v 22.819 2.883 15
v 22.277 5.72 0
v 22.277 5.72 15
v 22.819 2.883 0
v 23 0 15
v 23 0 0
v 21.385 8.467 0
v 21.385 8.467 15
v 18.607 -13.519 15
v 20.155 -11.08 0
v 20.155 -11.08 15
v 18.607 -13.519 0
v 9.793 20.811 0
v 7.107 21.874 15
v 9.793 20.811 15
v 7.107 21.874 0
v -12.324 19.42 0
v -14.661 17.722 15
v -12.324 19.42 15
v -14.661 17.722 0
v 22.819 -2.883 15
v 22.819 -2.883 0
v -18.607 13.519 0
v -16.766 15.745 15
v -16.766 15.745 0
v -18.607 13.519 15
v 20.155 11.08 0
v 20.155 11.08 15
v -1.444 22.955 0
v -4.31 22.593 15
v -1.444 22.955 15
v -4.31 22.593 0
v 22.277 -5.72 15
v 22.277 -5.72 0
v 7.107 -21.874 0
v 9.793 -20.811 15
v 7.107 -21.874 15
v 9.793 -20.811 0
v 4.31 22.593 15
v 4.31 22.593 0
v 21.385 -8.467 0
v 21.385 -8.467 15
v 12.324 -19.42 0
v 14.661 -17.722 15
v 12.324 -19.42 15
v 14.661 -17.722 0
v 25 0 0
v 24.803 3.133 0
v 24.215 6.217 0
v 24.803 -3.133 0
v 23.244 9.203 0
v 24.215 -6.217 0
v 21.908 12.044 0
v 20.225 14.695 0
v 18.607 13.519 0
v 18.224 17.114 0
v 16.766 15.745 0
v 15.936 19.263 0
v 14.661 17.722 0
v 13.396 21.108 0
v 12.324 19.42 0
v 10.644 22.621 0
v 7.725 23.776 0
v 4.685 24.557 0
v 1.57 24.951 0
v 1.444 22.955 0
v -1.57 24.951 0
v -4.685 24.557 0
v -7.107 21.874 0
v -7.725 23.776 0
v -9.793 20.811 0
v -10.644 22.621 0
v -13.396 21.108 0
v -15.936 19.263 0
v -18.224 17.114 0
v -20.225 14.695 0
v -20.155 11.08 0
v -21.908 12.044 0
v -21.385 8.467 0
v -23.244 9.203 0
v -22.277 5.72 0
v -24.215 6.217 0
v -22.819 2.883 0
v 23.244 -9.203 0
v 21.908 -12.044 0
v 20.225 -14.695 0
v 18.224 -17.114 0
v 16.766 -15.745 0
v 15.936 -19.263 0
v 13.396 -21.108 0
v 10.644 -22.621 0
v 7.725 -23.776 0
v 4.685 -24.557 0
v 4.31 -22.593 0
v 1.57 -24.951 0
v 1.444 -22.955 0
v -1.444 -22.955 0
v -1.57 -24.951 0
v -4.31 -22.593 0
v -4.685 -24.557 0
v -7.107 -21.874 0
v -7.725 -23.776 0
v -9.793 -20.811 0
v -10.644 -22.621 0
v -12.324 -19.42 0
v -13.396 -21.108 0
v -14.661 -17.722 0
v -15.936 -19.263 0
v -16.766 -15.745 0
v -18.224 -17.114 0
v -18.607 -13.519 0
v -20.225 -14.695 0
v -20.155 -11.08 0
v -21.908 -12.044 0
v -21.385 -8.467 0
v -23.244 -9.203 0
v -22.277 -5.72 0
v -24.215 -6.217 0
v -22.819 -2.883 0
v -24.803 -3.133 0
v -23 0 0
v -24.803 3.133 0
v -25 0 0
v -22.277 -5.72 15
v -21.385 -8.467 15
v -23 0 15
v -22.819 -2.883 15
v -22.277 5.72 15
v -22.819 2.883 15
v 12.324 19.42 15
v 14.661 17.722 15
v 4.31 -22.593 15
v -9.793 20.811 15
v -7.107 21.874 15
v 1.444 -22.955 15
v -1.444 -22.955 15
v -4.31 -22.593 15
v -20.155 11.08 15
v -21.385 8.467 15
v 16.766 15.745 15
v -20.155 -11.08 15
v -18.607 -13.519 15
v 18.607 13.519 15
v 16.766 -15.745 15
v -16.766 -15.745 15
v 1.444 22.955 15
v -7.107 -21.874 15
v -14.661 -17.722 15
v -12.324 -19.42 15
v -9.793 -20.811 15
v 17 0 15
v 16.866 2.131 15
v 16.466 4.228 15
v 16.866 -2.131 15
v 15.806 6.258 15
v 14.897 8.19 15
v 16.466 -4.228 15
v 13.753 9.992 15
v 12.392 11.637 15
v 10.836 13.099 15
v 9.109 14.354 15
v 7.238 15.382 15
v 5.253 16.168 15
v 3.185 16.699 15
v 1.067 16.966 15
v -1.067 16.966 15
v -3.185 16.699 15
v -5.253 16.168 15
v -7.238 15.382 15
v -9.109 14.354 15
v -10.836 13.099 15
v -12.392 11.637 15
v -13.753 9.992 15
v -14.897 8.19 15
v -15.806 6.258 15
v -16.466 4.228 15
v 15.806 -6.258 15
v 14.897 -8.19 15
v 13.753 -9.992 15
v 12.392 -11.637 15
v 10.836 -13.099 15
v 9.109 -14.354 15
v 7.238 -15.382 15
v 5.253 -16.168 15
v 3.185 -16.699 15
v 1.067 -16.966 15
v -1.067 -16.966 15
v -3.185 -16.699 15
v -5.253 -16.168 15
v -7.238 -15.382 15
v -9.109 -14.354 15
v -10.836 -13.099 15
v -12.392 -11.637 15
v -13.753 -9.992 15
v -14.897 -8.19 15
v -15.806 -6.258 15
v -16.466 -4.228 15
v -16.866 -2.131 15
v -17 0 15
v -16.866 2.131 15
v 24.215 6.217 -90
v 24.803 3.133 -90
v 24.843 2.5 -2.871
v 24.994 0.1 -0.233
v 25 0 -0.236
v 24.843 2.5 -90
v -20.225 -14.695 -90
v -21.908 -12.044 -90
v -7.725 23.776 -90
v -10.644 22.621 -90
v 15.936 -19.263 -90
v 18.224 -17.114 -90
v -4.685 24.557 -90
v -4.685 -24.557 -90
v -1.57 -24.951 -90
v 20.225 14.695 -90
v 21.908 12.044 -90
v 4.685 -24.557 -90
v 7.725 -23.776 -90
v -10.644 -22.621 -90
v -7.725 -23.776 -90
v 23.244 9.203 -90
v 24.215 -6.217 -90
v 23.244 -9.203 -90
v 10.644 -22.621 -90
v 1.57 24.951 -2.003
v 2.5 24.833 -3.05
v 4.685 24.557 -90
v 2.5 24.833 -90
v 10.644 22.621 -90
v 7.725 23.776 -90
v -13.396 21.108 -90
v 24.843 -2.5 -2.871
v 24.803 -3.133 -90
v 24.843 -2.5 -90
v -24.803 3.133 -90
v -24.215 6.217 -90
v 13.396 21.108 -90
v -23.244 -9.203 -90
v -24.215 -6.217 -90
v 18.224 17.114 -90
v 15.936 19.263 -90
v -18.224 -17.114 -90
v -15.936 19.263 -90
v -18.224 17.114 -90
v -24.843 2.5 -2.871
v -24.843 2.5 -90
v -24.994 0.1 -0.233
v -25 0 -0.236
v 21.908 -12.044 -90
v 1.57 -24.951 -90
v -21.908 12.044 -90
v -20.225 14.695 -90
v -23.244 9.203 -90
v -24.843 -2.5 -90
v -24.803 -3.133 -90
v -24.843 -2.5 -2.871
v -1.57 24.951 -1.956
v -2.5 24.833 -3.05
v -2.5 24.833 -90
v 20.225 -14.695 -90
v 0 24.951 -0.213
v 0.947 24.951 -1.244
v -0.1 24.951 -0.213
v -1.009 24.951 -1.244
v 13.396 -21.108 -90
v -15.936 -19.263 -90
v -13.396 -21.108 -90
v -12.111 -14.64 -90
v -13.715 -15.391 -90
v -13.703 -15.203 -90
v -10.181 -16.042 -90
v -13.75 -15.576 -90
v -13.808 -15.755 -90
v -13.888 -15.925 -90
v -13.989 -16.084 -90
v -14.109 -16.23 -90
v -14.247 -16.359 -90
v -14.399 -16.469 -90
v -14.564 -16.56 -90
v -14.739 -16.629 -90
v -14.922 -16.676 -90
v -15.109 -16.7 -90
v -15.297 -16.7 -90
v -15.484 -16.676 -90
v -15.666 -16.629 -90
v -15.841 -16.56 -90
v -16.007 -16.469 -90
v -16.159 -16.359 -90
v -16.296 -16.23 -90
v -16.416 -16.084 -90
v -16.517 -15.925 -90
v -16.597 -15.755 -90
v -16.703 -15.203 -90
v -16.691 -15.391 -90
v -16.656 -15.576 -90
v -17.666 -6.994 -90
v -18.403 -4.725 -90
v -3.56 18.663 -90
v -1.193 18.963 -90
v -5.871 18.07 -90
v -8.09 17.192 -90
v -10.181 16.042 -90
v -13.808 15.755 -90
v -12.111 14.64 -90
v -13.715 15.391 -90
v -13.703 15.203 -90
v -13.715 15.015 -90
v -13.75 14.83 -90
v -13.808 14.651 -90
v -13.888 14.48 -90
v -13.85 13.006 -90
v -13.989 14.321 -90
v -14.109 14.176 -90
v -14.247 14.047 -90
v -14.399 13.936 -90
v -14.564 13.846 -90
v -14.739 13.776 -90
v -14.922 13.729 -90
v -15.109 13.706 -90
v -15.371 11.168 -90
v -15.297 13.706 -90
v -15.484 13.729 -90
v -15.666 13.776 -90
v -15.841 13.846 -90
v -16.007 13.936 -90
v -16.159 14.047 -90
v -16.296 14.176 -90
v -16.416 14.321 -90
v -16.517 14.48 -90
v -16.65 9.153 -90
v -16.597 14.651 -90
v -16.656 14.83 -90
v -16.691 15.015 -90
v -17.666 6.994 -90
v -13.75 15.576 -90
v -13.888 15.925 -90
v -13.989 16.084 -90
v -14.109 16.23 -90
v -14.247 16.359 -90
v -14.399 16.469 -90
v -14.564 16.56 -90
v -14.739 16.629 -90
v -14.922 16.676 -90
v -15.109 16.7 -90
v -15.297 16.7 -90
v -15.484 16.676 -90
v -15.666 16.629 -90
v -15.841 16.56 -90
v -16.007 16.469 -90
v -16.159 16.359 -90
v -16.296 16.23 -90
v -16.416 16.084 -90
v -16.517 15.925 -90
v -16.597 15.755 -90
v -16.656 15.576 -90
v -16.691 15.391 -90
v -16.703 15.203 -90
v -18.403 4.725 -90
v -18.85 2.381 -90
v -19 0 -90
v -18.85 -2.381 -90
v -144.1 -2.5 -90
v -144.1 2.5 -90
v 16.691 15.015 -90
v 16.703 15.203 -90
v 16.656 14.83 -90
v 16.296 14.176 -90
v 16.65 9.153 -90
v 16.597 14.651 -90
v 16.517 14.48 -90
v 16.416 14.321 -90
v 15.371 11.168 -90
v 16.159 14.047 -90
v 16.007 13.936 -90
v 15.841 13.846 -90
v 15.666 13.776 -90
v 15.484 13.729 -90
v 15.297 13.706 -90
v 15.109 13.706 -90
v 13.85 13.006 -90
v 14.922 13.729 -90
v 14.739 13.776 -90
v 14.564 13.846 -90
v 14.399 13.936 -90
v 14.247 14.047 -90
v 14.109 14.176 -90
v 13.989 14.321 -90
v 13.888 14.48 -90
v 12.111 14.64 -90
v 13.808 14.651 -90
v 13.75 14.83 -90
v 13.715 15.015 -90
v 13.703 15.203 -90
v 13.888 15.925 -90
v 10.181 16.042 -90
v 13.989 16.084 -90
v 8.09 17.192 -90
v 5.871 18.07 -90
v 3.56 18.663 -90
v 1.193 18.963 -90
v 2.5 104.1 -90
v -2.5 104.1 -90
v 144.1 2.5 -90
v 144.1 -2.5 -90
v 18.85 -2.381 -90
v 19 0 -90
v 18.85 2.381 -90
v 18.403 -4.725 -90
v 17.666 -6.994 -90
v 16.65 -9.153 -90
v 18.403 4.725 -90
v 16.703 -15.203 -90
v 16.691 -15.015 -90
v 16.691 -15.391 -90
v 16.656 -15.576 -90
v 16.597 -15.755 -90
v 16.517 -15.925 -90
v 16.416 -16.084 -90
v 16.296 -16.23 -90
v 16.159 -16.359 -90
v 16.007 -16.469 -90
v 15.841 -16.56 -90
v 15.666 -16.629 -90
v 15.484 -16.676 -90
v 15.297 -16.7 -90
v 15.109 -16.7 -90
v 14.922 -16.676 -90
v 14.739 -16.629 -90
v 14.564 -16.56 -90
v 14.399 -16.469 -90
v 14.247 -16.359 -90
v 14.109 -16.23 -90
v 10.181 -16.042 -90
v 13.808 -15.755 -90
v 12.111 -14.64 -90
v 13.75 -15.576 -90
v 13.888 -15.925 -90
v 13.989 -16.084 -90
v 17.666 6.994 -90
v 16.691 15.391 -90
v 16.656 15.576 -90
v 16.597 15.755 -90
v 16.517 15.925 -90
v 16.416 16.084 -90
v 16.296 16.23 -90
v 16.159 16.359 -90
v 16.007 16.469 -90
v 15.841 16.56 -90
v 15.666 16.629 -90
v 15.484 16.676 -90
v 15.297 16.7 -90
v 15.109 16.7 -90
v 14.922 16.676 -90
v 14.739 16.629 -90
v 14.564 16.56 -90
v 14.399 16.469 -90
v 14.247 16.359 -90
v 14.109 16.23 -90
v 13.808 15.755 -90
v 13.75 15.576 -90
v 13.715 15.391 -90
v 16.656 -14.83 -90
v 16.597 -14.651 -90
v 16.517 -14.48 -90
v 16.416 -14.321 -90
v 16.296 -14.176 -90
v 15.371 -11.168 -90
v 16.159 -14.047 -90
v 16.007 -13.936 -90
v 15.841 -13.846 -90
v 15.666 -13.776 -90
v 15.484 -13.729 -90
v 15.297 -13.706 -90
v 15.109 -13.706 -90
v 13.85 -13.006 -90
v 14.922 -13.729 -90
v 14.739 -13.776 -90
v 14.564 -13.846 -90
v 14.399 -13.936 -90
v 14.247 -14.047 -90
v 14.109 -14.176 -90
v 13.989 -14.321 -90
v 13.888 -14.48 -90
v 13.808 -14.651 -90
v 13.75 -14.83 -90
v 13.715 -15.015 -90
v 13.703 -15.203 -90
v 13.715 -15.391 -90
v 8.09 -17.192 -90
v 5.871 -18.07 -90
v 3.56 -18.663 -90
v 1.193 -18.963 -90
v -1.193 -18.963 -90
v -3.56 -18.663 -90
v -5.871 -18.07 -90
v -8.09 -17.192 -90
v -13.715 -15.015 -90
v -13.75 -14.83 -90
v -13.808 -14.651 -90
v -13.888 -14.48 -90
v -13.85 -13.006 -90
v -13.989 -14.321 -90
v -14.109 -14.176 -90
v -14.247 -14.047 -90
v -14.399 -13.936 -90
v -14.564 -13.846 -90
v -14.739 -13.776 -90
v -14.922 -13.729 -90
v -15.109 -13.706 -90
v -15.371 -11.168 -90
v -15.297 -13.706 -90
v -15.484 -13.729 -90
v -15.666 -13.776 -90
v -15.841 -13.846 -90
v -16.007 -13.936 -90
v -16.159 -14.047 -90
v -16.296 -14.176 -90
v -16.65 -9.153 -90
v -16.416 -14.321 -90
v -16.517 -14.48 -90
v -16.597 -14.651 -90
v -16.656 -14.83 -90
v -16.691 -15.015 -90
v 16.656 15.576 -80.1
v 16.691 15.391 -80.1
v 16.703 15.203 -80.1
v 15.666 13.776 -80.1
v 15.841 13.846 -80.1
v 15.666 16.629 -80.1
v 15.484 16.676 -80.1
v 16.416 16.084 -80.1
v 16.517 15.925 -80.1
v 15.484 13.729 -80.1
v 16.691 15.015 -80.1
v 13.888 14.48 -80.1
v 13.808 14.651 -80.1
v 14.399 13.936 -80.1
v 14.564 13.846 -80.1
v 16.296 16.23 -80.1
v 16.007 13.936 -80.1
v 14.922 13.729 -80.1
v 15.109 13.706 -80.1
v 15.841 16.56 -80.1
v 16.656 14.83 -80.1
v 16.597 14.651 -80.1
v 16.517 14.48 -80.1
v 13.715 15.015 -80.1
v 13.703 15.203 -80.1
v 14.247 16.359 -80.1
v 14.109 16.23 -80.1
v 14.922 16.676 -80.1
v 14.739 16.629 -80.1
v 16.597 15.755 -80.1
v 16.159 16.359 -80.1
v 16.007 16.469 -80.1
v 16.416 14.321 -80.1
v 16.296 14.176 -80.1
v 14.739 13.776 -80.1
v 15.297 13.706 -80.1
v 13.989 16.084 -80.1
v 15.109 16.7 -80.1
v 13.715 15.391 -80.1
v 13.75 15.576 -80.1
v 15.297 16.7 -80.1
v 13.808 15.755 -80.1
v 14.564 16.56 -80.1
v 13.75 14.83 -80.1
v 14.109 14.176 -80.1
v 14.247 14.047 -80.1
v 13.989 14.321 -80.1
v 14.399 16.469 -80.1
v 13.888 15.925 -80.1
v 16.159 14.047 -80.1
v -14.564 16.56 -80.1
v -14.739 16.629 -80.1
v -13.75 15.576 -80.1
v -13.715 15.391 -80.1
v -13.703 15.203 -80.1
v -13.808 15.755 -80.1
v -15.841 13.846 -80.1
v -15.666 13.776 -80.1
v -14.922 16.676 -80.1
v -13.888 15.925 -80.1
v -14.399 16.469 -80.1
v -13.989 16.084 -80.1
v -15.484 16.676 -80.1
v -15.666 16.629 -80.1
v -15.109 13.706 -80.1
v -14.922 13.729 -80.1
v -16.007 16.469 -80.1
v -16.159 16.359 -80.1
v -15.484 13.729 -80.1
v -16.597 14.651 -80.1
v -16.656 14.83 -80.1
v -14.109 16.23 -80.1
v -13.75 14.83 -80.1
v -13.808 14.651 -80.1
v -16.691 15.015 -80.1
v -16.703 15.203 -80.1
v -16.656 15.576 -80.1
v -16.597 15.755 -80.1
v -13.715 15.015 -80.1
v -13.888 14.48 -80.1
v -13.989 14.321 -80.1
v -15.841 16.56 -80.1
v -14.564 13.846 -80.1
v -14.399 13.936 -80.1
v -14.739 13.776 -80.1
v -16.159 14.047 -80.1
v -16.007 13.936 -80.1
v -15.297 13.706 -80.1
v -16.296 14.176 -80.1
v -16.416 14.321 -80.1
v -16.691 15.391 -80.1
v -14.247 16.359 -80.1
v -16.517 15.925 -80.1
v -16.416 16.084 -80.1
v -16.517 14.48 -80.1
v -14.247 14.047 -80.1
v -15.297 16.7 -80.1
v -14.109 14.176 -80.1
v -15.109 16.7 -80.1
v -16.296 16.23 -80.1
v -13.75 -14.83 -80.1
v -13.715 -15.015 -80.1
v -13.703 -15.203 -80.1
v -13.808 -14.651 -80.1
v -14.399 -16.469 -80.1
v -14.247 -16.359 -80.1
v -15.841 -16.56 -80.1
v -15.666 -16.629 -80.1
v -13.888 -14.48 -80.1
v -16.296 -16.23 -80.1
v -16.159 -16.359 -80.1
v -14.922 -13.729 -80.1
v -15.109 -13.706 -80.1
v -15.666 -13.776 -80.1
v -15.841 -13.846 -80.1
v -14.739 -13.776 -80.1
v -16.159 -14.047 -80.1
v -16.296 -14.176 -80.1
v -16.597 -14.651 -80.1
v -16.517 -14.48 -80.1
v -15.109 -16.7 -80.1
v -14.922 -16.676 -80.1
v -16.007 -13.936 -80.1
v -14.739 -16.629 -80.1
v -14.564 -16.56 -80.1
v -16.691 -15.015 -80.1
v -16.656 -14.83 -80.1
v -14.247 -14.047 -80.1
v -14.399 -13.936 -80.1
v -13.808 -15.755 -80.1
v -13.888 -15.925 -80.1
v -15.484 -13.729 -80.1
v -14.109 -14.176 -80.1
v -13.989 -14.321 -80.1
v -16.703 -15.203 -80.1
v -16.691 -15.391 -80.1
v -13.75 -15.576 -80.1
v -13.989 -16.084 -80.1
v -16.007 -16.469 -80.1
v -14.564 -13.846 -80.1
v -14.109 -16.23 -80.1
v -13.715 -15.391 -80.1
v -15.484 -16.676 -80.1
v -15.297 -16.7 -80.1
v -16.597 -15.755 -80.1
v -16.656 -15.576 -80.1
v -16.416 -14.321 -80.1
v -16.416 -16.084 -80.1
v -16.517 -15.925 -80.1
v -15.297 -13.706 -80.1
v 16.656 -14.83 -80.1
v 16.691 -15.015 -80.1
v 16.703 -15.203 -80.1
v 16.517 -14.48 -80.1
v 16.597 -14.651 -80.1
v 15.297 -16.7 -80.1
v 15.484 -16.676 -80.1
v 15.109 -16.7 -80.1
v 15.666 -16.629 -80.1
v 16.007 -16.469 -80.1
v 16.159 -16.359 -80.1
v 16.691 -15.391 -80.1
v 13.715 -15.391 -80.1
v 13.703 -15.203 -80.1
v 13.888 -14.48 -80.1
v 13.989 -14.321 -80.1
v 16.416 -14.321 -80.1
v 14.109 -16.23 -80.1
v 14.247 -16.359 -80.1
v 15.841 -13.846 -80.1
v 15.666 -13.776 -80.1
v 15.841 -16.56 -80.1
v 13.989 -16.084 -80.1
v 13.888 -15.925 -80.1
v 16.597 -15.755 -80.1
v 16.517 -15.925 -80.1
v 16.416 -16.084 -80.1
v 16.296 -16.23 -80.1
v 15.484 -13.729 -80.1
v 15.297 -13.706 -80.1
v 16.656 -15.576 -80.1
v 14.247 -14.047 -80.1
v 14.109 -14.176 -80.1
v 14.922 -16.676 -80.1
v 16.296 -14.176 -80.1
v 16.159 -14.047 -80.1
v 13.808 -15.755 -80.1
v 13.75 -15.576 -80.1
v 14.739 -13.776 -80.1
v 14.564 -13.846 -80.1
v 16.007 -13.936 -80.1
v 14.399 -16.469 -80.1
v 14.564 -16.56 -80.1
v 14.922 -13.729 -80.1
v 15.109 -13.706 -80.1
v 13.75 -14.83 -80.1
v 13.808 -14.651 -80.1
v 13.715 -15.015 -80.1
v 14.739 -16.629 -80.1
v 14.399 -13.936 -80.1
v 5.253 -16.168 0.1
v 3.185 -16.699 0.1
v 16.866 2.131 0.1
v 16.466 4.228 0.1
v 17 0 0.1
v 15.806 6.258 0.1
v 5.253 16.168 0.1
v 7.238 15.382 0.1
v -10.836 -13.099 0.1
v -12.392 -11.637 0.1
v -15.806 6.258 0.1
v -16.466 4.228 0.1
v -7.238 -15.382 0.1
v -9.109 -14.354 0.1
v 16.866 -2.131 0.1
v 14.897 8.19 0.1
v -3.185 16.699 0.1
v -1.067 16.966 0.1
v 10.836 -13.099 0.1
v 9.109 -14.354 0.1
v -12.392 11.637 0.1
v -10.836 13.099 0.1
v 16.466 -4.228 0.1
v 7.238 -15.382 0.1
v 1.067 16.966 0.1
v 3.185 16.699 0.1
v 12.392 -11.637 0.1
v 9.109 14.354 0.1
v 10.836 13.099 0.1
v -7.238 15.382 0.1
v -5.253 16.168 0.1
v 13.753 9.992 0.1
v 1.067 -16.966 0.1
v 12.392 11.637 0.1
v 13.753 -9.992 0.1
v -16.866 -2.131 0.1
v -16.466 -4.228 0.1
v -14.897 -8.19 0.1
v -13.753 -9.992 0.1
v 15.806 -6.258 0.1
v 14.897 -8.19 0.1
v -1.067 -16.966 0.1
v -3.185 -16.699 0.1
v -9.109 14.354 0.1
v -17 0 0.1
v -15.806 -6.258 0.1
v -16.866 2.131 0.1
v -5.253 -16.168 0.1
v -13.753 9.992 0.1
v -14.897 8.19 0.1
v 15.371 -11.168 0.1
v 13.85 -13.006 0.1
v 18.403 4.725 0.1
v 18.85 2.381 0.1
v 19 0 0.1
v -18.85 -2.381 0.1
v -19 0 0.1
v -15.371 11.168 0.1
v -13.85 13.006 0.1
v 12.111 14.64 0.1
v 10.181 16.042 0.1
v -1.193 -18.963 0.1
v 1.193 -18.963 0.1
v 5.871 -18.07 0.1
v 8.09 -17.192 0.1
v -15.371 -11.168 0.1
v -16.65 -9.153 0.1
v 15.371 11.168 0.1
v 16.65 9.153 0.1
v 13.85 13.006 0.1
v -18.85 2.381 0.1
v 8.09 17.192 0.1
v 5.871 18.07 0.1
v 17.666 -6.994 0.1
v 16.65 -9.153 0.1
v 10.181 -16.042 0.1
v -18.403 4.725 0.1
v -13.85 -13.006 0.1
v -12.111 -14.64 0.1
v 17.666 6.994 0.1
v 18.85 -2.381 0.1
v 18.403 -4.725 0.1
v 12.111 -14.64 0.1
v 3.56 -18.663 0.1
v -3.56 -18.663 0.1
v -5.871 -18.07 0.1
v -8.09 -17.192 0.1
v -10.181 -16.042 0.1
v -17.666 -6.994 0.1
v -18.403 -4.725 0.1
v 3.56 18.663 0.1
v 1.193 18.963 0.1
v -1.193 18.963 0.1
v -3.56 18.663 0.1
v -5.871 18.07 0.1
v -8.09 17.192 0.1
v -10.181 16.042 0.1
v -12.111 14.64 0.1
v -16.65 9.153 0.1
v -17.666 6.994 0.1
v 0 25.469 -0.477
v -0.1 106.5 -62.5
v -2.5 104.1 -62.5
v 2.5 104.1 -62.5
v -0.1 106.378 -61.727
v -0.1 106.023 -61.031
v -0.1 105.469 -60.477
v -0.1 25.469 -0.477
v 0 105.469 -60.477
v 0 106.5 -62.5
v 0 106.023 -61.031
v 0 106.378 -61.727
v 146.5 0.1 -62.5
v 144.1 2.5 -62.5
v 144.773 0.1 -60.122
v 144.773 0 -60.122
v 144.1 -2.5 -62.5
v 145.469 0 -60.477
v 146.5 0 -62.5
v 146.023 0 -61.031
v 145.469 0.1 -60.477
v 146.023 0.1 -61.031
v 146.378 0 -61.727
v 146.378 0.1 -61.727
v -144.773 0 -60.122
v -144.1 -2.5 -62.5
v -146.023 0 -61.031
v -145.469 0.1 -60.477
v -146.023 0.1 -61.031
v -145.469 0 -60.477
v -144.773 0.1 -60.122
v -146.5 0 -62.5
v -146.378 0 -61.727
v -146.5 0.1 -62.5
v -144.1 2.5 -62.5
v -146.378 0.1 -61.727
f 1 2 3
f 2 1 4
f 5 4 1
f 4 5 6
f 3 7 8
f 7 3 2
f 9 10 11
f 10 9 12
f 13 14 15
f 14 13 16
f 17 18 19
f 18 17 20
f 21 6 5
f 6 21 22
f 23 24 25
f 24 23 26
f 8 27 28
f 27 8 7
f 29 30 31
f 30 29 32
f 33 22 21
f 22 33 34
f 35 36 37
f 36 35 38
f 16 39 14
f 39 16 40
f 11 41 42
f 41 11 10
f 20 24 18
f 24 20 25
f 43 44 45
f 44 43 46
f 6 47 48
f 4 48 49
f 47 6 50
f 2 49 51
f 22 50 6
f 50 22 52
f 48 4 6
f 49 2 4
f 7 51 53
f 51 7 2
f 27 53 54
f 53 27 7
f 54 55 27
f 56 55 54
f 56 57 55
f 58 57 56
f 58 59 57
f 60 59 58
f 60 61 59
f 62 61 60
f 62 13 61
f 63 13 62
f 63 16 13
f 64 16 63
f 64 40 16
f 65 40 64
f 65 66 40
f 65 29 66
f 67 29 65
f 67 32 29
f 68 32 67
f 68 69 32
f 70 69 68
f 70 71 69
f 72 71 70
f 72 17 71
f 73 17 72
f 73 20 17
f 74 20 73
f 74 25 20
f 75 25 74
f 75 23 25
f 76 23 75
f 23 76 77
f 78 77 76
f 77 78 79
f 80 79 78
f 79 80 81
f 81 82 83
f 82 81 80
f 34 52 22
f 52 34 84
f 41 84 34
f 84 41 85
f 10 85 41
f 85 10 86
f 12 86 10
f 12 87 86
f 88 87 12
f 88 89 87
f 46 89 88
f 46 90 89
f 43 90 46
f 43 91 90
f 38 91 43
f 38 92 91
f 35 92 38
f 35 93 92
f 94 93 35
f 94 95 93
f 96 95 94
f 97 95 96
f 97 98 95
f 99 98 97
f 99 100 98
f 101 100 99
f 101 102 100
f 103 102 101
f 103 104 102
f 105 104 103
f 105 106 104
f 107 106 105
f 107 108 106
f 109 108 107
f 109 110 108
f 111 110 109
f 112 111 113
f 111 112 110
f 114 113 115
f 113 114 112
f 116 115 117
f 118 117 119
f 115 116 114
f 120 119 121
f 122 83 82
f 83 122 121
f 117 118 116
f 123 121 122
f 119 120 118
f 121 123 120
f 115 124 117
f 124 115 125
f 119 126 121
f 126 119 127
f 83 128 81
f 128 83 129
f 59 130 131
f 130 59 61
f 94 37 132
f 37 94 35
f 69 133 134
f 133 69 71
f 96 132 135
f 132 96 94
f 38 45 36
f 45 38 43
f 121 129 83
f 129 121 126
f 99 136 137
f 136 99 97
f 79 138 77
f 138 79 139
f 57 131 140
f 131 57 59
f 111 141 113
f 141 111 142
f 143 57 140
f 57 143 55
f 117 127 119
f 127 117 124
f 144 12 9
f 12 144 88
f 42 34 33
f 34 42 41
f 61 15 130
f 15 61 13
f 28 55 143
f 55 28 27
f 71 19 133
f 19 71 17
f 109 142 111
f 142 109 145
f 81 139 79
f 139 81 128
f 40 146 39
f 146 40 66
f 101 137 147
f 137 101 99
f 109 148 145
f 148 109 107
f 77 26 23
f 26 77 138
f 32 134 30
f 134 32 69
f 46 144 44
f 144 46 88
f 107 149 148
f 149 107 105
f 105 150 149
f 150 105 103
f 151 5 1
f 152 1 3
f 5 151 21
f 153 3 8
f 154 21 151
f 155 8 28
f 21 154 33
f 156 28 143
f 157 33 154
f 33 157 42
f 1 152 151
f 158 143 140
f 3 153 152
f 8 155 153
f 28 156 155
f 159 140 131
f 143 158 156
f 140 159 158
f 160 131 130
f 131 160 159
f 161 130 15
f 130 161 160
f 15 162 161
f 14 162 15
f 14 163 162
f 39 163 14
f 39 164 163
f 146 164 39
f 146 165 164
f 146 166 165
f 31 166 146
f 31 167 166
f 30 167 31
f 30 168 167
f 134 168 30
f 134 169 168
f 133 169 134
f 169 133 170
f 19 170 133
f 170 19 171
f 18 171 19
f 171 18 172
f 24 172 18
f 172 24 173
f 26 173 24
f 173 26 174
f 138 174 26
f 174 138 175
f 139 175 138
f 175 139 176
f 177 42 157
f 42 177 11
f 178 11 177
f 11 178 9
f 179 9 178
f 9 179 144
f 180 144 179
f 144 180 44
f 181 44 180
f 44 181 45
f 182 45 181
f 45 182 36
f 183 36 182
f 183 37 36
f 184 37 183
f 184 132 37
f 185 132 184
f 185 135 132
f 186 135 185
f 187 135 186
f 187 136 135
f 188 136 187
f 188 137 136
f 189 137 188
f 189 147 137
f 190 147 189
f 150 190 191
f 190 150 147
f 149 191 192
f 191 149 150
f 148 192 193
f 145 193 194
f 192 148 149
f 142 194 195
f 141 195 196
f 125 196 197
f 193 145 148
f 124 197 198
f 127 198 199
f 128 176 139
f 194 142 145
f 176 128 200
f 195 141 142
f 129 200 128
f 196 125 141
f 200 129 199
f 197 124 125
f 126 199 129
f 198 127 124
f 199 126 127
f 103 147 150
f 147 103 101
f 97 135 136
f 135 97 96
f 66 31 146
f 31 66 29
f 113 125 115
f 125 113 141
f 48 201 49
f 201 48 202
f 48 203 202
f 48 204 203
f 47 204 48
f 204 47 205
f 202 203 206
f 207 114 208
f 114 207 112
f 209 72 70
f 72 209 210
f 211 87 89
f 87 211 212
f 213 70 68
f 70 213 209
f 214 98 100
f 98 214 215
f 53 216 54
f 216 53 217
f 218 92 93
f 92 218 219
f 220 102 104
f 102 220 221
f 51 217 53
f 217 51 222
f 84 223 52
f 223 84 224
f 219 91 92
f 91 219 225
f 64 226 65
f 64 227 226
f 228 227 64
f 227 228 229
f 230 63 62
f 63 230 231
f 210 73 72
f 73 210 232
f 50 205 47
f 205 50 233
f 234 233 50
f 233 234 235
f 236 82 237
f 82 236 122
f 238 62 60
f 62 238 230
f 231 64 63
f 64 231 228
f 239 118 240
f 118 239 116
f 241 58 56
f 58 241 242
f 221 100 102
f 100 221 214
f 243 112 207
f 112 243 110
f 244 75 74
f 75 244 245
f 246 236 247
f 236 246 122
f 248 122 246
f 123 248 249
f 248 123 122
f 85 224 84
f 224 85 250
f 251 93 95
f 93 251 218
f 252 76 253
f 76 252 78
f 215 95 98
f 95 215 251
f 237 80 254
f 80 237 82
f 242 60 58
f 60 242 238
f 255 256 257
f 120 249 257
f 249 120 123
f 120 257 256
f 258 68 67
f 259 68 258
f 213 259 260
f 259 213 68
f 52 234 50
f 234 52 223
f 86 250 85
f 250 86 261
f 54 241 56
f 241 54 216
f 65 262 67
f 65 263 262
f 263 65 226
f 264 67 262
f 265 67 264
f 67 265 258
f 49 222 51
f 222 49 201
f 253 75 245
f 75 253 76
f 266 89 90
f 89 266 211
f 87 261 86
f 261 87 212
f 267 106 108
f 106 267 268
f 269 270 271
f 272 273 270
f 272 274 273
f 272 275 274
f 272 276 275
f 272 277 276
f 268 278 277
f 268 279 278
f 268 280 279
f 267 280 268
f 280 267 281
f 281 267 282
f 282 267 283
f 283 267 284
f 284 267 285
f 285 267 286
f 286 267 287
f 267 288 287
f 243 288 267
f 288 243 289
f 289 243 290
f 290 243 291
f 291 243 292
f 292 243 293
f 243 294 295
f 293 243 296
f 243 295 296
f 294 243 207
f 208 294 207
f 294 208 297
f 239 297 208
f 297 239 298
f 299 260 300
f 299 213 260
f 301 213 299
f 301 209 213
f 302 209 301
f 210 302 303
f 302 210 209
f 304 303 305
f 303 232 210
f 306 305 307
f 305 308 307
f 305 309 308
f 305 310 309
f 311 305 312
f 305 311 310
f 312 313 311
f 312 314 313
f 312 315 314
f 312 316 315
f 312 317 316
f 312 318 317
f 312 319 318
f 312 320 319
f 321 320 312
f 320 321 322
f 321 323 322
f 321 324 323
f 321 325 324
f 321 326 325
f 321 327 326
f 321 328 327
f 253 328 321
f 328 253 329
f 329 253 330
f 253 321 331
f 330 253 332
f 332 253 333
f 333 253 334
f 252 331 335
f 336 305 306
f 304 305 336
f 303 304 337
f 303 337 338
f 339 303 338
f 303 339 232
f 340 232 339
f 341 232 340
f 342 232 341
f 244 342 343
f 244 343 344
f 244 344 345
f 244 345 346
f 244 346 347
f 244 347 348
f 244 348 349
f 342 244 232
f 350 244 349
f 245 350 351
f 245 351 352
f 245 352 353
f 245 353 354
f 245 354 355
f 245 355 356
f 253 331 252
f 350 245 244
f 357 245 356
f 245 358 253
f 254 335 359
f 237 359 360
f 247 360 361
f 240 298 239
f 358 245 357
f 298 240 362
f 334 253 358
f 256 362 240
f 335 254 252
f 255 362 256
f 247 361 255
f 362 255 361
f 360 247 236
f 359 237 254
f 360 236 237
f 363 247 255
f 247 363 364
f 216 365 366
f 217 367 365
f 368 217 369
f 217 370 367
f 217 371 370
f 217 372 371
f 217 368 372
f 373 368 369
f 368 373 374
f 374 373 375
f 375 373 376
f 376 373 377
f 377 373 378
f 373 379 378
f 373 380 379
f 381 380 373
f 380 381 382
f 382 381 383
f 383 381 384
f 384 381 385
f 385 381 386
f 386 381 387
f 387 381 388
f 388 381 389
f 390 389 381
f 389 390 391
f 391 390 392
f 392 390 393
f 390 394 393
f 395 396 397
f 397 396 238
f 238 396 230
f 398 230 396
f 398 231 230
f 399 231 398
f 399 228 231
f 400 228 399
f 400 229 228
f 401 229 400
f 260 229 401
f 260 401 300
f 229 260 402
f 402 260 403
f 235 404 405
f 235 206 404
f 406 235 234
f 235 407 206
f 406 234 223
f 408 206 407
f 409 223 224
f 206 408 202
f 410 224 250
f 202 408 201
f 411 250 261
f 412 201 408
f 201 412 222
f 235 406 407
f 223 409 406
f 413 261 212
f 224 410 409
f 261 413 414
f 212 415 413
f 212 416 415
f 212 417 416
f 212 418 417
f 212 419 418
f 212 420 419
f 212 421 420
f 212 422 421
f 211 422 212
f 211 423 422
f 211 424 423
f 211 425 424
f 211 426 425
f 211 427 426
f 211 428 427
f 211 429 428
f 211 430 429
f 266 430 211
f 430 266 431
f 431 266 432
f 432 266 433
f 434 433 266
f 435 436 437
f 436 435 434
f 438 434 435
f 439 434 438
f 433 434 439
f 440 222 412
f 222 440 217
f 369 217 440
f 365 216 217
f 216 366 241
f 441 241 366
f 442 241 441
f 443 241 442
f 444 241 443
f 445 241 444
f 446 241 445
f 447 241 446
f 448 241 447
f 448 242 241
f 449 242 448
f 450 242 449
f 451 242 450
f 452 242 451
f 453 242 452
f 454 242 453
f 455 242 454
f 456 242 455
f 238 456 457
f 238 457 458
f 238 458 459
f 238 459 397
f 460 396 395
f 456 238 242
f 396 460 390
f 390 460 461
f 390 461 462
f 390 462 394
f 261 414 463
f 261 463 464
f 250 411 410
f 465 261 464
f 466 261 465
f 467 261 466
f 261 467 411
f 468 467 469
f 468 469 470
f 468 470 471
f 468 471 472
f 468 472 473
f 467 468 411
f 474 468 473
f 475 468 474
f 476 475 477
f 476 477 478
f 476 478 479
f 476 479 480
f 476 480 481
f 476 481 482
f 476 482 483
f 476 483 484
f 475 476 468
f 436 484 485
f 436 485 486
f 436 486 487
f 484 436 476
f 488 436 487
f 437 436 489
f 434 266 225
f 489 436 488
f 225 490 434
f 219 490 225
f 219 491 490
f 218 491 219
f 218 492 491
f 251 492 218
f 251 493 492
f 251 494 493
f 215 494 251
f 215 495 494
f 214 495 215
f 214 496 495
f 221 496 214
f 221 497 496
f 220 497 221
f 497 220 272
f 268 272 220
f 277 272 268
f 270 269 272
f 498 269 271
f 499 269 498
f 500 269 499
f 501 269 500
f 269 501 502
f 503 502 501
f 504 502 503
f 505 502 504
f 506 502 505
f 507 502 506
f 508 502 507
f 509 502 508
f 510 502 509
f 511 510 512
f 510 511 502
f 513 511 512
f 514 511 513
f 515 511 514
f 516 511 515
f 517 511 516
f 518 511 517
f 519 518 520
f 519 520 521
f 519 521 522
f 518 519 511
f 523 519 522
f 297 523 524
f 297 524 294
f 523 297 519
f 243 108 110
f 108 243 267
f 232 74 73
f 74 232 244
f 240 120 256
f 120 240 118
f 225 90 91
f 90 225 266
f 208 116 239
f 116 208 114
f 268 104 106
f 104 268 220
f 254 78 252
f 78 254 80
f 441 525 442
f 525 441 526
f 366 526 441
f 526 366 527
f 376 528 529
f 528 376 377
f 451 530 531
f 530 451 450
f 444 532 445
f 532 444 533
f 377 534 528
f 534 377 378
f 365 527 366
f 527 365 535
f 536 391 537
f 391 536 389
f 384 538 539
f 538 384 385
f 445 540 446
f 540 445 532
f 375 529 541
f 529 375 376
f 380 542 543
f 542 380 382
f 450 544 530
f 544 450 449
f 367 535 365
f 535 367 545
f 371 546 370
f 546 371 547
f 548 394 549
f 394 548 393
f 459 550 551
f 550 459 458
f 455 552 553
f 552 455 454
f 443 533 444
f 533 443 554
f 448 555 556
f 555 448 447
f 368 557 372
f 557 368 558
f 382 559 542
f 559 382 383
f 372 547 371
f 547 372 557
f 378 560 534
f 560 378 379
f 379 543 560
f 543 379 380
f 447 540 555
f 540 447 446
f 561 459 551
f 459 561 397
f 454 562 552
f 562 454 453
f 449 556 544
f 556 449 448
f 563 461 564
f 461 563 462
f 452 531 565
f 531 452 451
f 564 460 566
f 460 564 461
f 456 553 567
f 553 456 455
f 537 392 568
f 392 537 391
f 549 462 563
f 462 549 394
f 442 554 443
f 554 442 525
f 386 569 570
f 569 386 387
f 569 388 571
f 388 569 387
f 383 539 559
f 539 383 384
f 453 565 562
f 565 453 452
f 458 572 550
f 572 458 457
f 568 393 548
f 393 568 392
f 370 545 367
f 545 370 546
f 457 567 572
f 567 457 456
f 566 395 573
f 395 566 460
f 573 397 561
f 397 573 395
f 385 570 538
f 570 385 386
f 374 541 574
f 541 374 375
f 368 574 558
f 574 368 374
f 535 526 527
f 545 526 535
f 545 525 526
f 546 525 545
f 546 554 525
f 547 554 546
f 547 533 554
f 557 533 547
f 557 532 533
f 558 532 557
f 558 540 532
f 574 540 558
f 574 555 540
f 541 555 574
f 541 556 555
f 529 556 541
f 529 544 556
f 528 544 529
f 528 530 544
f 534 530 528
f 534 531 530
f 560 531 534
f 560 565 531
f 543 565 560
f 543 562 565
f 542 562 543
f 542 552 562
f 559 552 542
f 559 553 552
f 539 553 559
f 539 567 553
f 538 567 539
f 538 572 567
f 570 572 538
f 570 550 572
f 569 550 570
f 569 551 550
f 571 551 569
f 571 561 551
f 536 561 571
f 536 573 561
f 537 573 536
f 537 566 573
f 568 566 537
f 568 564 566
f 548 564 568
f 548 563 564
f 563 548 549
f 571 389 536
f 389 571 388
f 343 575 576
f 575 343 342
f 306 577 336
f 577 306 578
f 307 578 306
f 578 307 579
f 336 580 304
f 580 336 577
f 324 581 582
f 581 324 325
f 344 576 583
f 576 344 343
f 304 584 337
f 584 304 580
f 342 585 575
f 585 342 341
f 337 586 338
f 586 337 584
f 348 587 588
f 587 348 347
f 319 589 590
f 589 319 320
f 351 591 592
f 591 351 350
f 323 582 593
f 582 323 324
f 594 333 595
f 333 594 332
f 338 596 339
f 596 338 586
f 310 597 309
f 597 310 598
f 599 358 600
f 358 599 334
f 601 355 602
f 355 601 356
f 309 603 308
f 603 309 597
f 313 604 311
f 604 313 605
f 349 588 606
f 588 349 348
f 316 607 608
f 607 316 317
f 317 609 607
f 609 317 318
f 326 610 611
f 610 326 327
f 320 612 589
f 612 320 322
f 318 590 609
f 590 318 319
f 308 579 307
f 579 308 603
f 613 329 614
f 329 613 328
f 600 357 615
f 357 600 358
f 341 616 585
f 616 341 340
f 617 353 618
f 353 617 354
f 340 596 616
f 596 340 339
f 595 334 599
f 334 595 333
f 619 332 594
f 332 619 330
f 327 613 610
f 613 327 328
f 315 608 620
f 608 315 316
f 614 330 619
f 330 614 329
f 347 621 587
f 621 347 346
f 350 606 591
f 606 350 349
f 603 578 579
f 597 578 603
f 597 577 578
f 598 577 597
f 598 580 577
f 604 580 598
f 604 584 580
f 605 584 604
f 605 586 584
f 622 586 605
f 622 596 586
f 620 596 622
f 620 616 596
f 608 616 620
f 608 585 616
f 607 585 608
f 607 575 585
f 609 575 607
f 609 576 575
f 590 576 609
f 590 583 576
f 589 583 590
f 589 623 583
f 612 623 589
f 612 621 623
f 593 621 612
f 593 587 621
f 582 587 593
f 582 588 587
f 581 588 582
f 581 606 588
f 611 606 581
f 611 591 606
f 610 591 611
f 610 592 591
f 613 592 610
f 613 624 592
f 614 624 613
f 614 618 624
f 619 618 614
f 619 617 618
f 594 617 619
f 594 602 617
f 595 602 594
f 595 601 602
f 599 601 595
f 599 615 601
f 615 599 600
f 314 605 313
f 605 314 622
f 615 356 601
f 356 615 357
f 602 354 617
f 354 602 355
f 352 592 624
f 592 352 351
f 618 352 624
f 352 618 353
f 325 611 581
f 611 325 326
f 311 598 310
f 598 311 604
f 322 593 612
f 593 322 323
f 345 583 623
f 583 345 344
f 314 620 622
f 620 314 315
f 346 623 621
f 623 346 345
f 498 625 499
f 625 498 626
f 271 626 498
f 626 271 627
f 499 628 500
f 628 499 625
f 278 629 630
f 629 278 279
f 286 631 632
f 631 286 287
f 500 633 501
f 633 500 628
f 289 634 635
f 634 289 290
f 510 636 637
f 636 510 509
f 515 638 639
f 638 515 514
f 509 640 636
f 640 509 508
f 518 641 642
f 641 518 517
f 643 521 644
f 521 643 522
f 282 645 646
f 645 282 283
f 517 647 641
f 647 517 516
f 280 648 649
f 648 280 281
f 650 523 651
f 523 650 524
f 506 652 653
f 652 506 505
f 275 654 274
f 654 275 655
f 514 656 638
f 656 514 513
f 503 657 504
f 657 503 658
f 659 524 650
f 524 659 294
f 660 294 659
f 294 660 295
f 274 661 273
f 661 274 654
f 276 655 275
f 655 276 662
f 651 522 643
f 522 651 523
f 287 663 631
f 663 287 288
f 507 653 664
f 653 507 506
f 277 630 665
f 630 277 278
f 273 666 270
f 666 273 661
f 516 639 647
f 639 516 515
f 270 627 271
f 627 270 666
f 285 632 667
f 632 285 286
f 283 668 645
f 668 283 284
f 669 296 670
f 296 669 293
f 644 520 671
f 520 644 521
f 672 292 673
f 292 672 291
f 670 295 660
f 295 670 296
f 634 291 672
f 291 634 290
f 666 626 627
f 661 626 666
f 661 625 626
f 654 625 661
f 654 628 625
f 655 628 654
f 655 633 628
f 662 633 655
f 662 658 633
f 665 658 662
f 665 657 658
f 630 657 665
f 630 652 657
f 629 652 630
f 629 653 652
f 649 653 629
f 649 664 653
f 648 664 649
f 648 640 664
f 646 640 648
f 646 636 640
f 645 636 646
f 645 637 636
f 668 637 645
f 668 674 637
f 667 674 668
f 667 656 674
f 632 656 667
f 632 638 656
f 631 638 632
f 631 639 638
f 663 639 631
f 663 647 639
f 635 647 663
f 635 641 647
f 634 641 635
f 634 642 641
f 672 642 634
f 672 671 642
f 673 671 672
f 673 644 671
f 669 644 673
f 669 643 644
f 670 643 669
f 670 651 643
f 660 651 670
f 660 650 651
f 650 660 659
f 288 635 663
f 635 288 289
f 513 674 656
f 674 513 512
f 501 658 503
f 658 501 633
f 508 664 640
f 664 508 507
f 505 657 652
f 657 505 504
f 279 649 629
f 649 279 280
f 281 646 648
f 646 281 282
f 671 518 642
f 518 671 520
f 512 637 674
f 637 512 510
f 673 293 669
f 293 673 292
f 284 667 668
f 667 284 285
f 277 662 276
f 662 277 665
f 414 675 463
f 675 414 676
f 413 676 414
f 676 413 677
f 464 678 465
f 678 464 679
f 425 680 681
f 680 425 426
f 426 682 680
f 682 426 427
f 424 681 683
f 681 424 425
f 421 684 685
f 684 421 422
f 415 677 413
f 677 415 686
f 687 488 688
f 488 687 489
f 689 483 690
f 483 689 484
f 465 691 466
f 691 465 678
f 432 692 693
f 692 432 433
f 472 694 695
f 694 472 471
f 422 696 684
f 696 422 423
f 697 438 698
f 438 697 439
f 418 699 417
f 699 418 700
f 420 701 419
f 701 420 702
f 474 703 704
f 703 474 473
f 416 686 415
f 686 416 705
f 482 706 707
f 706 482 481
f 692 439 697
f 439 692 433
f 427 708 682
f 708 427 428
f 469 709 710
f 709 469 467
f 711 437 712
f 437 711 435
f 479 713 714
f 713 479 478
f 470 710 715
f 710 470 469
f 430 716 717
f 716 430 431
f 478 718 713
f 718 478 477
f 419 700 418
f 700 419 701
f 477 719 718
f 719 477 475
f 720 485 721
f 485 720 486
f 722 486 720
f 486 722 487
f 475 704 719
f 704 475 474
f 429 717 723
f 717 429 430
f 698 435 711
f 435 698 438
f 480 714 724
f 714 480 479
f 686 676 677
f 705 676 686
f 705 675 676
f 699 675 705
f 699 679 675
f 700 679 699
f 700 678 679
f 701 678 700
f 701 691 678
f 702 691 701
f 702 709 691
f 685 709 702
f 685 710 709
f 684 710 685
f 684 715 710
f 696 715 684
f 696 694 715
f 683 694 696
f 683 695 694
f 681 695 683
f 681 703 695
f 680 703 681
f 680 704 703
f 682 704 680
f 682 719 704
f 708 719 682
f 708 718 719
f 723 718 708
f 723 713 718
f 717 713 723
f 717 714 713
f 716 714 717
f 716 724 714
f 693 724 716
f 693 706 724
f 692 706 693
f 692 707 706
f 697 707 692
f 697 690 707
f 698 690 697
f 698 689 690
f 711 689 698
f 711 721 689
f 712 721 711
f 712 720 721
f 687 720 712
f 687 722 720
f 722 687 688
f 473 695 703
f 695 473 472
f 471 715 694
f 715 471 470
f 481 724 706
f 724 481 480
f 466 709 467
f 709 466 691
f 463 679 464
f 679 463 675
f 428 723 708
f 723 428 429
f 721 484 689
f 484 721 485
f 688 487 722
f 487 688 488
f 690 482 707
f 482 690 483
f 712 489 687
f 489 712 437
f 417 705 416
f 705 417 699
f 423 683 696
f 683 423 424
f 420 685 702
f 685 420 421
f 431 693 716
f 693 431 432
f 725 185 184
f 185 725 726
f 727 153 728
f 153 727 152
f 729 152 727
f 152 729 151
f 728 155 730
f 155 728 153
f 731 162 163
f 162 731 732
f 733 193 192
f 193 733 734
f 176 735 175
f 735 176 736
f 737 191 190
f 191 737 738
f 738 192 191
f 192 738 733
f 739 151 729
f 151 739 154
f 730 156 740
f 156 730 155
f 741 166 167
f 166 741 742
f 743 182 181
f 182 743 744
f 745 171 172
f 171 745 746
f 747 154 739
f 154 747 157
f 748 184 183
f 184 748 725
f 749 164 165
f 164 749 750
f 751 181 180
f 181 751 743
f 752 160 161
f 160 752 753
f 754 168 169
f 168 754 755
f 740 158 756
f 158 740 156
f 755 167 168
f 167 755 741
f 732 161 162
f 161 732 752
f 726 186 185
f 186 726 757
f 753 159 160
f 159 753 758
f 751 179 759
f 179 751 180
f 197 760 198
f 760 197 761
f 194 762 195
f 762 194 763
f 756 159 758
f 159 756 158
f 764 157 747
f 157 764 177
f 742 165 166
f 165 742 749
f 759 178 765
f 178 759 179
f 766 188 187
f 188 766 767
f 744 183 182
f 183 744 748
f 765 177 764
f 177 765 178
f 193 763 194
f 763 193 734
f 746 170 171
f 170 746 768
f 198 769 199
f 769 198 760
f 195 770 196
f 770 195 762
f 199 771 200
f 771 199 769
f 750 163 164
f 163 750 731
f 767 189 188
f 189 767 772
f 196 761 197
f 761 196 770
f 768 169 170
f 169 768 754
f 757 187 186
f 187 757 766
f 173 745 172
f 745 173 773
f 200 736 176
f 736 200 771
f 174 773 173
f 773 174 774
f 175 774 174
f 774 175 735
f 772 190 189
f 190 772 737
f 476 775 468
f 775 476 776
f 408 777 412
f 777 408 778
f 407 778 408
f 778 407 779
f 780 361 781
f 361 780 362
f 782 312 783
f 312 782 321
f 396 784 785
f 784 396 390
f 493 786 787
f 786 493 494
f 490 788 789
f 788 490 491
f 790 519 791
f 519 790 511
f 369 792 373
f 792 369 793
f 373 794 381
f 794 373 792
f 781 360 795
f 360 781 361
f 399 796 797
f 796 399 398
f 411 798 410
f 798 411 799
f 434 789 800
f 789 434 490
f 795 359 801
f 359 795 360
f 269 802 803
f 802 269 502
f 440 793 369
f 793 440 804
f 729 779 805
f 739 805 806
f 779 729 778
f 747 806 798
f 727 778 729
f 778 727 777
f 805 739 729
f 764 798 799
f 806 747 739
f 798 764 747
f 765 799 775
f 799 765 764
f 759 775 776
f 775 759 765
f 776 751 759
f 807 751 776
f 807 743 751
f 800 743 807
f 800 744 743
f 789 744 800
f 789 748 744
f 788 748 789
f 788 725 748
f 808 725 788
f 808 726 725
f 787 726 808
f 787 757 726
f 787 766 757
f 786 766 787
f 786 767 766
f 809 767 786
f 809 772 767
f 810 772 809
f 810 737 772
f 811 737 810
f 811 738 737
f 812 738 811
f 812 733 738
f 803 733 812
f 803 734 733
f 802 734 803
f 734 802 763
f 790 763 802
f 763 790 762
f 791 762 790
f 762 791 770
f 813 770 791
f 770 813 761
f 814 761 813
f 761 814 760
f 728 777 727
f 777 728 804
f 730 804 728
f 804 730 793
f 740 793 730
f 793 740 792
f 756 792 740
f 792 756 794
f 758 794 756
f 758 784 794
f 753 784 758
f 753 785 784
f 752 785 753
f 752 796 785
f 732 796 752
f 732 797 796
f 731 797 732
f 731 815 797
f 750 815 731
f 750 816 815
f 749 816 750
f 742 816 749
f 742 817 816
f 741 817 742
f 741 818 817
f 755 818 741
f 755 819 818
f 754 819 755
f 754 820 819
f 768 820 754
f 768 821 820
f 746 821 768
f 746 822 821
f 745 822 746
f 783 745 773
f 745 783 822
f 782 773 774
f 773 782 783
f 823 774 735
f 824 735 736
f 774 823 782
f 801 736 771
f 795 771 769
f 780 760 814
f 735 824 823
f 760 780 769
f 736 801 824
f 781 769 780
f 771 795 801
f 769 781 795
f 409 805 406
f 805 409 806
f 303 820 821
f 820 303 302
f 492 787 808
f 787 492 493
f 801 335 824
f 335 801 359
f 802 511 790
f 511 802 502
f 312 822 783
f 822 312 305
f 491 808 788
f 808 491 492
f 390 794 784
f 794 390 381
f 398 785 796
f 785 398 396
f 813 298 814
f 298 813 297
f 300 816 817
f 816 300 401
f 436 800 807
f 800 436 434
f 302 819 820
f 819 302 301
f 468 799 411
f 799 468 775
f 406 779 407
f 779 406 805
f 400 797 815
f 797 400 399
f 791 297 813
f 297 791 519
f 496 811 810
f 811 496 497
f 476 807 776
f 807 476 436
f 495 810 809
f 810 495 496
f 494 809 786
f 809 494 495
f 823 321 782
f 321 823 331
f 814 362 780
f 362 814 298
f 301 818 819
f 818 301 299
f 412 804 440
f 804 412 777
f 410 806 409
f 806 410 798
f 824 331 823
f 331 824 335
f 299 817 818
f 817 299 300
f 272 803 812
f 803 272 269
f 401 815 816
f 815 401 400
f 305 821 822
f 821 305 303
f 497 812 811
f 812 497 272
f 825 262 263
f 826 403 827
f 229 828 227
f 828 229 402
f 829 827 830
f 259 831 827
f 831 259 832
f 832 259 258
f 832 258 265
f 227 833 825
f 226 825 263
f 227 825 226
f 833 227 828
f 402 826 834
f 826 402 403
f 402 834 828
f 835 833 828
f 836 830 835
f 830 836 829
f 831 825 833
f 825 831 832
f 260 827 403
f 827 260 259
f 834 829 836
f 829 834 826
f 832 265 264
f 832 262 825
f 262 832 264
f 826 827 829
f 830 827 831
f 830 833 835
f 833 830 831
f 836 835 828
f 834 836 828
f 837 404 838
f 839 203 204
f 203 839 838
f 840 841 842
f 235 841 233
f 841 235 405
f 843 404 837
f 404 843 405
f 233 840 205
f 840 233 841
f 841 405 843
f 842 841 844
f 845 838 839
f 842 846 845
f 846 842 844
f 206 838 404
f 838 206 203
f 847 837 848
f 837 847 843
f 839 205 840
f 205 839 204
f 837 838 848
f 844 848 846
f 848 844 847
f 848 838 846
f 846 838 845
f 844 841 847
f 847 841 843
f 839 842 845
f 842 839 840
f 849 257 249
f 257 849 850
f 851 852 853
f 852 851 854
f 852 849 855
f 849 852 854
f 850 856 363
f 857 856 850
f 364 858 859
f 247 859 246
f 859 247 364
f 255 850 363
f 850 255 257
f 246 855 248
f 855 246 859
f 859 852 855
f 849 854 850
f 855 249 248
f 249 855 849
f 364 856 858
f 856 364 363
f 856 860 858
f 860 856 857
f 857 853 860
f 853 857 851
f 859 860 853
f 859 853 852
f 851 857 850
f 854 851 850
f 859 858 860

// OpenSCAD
// --- Variables ---
tube_diameter = 50;
tube_radius = tube_diameter / 2;
adapter_length = 15;     // How far it plugs into the paper tube (USER REQ 2)
wall_thickness = 6;      // Wall thickness of the plug
tube_wall_thickness = 2; // NEW: Thickness of the paper fuselage tube
fin_thickness = 5;       // Thickness of all fins
fin_servo_gap = 0;       // Gap at the back of the fin for control surfaces
fin_inset = 1;           // NEW: How far fins are inset into the body for a good join

// Motor Mount
// motor_mount_plate_thickness will be set after fins are defined
motor_shaft_hole_dia = 15;       // Center hole for motor shaft/wires
motor_mount_spacing = 43;        // 'X' pattern spacing for motor screws (common for 50mm class)
motor_mount_hole_dia = 3;        // Motor screw hole diameter
motor_mount_screw_hole_depth = 10; // How deep to make the screw holes from the back

// Vertical Fin (Rudder)
vertical_fin_height = 80;
vertical_fin_root_chord = 90; // Length at the base
vertical_fin_tip_chord = 30;  // Length at the top
vertical_fin_leading_sweep = 20; // How far back the tip's leading edge is (positive = swept back)

// Horizontal Fins (Elevators)
horizontal_fin_span = 120; // Span from fuselage center to tip
horizontal_fin_root_chord = 90;
horizontal_fin_tip_chord = 30;
horizontal_fin_leading_sweep = 5;

// Set external body length based on the longest fin (USER REQ 1)
motor_mount_plate_thickness = max(vertical_fin_root_chord, horizontal_fin_root_chord);


// --- Module Definitions ---

// Module for the main hollow tube and motor mount
module fuselage_plug() {
    difference() {
        // --- 1. Main solid plug and motor mount plate ---
        union() {
            // Main plug cylinder (goes forward into the tube)
            // MODIFIED: Radius is reduced to fit *inside* the paper tube
            cylinder(adapter_length, r=tube_radius - tube_wall_thickness);
            
            // Motor mount plate / Fin Body (sits at the back, z=0)
            // This remains at full radius to be flush with tube OD
            translate([0, 0, -motor_mount_plate_thickness])
            cylinder(motor_mount_plate_thickness, r=tube_radius);
        }
        
        // --- 2. Cutouts ---
        union() {
            // --- NEW: Hollow cutout for the adapter plug (z >= 0) ---
            // This part plugs into the tube.
            cylinder(adapter_length + 0.1, r = (tube_radius - tube_wall_thickness) - wall_thickness); 
            
            // --- NEW: Hollow cutout for the fin body (z < 0) ---
            // This part is flush with the tube OD.
            translate([0, 0, -motor_mount_plate_thickness - 0.1]) 
            cylinder(motor_mount_plate_thickness + 0.2, r = tube_radius - wall_thickness);
            
            // Motor shaft hole (goes all the way through for wires)
            translate([0, 0, -motor_mount_plate_thickness - 0.1])
            cylinder(adapter_length + motor_mount_plate_thickness + 0.2, d=motor_shaft_hole_dia);
            
            // Motor mount screw holes (in a 45-degree 'X' pattern)
            for (angle = [45, 135, 225, 315]) {
                translate([
                    cos(angle) * (motor_mount_spacing / 2),
                    sin(angle) * (motor_mount_spacing / 2),
                    -motor_mount_plate_thickness - 0.1 // Cut from the back plate
                ])
                // Cut only to a shallow depth
                cylinder(motor_mount_screw_hole_depth, d=motor_mount_hole_dia);
            }
        }
    }
}

// --- NEW: FIN MODULES WITH ROUNDED LEADING EDGE ---

// This sub-module creates the 2D "airfoil" profile in the XZ plane
// It will be hulled along the Y-axis (span)
module fin_airfoil_profile(chord, thickness) {
    radius = thickness / 2;
    // Profile in XZ plane
    // LE at x=0, TE at x=-chord
    // Centered on z=0
    
    // Main body: cube
    // from x=-chord to x=-radius
    translate([-chord, 0, -radius])
    cube([chord - radius, 0.1, thickness]); // 0.1 in Y for hulling
    
    // Rounded LE: cylinder
    // center at x=-radius, so front is at x=0
    translate([-radius, 0, 0])
    cylinder(h=0.1, r=radius, $fn=20);
}

// This module replaces the user's "fin" module
// It builds the fin planform in the XY plane, with thickness along Z.
// It uses hull() to create a rounded leading edge.
module fin(root_chord, tip_chord, span, leading_edge_sweep, thickness) {
    // NEW LOGIC (2025-11-02):
    // We want a straight trailing edge, as in the user's original polygon.
    // This means TE_Root_X = -root_chord
    // and TE_Tip_X = -root_chord
    //
    // The LE_Tip_X is then calculated from the TE_Tip_X and tip_chord:
    // LE_Tip_X = TE_Tip_X + tip_chord = -root_chord + tip_chord
    //
    // This model *ignores* the leading_edge_sweep variable, because
    // it's geometrically impossible to specify root_chord, tip_chord,
    // leading_edge_sweep, AND a straight trailing edge simultaneously.
    
    // The LE_Tip_X coordinate is the new translation offset.
    leading_edge_tip_x = -root_chord + tip_chord;

    hull() {
        // Root profile
        // at y=0 (span)
        // LE at x=0, TE at x=-root_chord
        fin_airfoil_profile(root_chord, thickness);
        
        // Tip profile
        // at y=span
        // LE at x = -root_chord + tip_chord
        // TE at x = (-root_chord + tip_chord) - tip_chord = -root_chord
        translate([leading_edge_tip_x, span, 0])
        fin_airfoil_profile(tip_chord, thickness);
    }
}


// --- Assemble the Tail Section ---
module tail_assembly() {
    union() {
        // 1. Fuselage Plug & Motor Mount
        fuselage_plug();
        
        // 2. Vertical Fin
        // Rotated 90 deg around Y-axis to stand up (span on Y, chord on Z)
        // We translate it to z=0 so it starts at the end of the tube
        // MODIFIED: Inset by `fin_inset`
        translate([0, tube_radius - fin_inset, 0]) // Position on top, inset slightly
        rotate([0, 270, 0])
        fin(vertical_fin_root_chord - fin_servo_gap, // Shorten fin to leave gap
            vertical_fin_tip_chord, 
            vertical_fin_height, 
            vertical_fin_leading_sweep, 
            fin_thickness);
        
        // 3. Horizontal Fins
        // Rotated to lay flat (span on X, chord on Z)
        
        // Right Fin (positive X)
        // MODIFIED: Inset by `fin_inset`
        translate([tube_radius - fin_inset, 0, 0]) // Position on right side, inset slightly
        rotate([0, 270, -90]) // Rotate chord to Z, then span to X
        fin(horizontal_fin_root_chord - fin_servo_gap, // Shorten fin to leave gap
            horizontal_fin_tip_chord, 
            horizontal_fin_span, 
            horizontal_fin_leading_sweep, 
            fin_thickness);
            
        // Left Fin (negative X)
        // We just mirror the right fin
        mirror([1, 0, 0]) {
            // MODIFIED: Inset by `fin_inset`
            translate([tube_radius - fin_inset, 0, 0]) // Position on right side, inset slightly
            rotate([0, 270, -90]) // Rotate chord to Z, then span to X
            fin(horizontal_fin_root_chord - fin_servo_gap, // Shorten fin to leave gap
                horizontal_fin_tip_chord, 
                horizontal_fin_span, 
                horizontal_fin_leading_sweep, 
                fin_thickness);
        }
    }
}

// --- Render the Module ---
$fn=50; // Increase segments for a smoother render
tail_assembly();
